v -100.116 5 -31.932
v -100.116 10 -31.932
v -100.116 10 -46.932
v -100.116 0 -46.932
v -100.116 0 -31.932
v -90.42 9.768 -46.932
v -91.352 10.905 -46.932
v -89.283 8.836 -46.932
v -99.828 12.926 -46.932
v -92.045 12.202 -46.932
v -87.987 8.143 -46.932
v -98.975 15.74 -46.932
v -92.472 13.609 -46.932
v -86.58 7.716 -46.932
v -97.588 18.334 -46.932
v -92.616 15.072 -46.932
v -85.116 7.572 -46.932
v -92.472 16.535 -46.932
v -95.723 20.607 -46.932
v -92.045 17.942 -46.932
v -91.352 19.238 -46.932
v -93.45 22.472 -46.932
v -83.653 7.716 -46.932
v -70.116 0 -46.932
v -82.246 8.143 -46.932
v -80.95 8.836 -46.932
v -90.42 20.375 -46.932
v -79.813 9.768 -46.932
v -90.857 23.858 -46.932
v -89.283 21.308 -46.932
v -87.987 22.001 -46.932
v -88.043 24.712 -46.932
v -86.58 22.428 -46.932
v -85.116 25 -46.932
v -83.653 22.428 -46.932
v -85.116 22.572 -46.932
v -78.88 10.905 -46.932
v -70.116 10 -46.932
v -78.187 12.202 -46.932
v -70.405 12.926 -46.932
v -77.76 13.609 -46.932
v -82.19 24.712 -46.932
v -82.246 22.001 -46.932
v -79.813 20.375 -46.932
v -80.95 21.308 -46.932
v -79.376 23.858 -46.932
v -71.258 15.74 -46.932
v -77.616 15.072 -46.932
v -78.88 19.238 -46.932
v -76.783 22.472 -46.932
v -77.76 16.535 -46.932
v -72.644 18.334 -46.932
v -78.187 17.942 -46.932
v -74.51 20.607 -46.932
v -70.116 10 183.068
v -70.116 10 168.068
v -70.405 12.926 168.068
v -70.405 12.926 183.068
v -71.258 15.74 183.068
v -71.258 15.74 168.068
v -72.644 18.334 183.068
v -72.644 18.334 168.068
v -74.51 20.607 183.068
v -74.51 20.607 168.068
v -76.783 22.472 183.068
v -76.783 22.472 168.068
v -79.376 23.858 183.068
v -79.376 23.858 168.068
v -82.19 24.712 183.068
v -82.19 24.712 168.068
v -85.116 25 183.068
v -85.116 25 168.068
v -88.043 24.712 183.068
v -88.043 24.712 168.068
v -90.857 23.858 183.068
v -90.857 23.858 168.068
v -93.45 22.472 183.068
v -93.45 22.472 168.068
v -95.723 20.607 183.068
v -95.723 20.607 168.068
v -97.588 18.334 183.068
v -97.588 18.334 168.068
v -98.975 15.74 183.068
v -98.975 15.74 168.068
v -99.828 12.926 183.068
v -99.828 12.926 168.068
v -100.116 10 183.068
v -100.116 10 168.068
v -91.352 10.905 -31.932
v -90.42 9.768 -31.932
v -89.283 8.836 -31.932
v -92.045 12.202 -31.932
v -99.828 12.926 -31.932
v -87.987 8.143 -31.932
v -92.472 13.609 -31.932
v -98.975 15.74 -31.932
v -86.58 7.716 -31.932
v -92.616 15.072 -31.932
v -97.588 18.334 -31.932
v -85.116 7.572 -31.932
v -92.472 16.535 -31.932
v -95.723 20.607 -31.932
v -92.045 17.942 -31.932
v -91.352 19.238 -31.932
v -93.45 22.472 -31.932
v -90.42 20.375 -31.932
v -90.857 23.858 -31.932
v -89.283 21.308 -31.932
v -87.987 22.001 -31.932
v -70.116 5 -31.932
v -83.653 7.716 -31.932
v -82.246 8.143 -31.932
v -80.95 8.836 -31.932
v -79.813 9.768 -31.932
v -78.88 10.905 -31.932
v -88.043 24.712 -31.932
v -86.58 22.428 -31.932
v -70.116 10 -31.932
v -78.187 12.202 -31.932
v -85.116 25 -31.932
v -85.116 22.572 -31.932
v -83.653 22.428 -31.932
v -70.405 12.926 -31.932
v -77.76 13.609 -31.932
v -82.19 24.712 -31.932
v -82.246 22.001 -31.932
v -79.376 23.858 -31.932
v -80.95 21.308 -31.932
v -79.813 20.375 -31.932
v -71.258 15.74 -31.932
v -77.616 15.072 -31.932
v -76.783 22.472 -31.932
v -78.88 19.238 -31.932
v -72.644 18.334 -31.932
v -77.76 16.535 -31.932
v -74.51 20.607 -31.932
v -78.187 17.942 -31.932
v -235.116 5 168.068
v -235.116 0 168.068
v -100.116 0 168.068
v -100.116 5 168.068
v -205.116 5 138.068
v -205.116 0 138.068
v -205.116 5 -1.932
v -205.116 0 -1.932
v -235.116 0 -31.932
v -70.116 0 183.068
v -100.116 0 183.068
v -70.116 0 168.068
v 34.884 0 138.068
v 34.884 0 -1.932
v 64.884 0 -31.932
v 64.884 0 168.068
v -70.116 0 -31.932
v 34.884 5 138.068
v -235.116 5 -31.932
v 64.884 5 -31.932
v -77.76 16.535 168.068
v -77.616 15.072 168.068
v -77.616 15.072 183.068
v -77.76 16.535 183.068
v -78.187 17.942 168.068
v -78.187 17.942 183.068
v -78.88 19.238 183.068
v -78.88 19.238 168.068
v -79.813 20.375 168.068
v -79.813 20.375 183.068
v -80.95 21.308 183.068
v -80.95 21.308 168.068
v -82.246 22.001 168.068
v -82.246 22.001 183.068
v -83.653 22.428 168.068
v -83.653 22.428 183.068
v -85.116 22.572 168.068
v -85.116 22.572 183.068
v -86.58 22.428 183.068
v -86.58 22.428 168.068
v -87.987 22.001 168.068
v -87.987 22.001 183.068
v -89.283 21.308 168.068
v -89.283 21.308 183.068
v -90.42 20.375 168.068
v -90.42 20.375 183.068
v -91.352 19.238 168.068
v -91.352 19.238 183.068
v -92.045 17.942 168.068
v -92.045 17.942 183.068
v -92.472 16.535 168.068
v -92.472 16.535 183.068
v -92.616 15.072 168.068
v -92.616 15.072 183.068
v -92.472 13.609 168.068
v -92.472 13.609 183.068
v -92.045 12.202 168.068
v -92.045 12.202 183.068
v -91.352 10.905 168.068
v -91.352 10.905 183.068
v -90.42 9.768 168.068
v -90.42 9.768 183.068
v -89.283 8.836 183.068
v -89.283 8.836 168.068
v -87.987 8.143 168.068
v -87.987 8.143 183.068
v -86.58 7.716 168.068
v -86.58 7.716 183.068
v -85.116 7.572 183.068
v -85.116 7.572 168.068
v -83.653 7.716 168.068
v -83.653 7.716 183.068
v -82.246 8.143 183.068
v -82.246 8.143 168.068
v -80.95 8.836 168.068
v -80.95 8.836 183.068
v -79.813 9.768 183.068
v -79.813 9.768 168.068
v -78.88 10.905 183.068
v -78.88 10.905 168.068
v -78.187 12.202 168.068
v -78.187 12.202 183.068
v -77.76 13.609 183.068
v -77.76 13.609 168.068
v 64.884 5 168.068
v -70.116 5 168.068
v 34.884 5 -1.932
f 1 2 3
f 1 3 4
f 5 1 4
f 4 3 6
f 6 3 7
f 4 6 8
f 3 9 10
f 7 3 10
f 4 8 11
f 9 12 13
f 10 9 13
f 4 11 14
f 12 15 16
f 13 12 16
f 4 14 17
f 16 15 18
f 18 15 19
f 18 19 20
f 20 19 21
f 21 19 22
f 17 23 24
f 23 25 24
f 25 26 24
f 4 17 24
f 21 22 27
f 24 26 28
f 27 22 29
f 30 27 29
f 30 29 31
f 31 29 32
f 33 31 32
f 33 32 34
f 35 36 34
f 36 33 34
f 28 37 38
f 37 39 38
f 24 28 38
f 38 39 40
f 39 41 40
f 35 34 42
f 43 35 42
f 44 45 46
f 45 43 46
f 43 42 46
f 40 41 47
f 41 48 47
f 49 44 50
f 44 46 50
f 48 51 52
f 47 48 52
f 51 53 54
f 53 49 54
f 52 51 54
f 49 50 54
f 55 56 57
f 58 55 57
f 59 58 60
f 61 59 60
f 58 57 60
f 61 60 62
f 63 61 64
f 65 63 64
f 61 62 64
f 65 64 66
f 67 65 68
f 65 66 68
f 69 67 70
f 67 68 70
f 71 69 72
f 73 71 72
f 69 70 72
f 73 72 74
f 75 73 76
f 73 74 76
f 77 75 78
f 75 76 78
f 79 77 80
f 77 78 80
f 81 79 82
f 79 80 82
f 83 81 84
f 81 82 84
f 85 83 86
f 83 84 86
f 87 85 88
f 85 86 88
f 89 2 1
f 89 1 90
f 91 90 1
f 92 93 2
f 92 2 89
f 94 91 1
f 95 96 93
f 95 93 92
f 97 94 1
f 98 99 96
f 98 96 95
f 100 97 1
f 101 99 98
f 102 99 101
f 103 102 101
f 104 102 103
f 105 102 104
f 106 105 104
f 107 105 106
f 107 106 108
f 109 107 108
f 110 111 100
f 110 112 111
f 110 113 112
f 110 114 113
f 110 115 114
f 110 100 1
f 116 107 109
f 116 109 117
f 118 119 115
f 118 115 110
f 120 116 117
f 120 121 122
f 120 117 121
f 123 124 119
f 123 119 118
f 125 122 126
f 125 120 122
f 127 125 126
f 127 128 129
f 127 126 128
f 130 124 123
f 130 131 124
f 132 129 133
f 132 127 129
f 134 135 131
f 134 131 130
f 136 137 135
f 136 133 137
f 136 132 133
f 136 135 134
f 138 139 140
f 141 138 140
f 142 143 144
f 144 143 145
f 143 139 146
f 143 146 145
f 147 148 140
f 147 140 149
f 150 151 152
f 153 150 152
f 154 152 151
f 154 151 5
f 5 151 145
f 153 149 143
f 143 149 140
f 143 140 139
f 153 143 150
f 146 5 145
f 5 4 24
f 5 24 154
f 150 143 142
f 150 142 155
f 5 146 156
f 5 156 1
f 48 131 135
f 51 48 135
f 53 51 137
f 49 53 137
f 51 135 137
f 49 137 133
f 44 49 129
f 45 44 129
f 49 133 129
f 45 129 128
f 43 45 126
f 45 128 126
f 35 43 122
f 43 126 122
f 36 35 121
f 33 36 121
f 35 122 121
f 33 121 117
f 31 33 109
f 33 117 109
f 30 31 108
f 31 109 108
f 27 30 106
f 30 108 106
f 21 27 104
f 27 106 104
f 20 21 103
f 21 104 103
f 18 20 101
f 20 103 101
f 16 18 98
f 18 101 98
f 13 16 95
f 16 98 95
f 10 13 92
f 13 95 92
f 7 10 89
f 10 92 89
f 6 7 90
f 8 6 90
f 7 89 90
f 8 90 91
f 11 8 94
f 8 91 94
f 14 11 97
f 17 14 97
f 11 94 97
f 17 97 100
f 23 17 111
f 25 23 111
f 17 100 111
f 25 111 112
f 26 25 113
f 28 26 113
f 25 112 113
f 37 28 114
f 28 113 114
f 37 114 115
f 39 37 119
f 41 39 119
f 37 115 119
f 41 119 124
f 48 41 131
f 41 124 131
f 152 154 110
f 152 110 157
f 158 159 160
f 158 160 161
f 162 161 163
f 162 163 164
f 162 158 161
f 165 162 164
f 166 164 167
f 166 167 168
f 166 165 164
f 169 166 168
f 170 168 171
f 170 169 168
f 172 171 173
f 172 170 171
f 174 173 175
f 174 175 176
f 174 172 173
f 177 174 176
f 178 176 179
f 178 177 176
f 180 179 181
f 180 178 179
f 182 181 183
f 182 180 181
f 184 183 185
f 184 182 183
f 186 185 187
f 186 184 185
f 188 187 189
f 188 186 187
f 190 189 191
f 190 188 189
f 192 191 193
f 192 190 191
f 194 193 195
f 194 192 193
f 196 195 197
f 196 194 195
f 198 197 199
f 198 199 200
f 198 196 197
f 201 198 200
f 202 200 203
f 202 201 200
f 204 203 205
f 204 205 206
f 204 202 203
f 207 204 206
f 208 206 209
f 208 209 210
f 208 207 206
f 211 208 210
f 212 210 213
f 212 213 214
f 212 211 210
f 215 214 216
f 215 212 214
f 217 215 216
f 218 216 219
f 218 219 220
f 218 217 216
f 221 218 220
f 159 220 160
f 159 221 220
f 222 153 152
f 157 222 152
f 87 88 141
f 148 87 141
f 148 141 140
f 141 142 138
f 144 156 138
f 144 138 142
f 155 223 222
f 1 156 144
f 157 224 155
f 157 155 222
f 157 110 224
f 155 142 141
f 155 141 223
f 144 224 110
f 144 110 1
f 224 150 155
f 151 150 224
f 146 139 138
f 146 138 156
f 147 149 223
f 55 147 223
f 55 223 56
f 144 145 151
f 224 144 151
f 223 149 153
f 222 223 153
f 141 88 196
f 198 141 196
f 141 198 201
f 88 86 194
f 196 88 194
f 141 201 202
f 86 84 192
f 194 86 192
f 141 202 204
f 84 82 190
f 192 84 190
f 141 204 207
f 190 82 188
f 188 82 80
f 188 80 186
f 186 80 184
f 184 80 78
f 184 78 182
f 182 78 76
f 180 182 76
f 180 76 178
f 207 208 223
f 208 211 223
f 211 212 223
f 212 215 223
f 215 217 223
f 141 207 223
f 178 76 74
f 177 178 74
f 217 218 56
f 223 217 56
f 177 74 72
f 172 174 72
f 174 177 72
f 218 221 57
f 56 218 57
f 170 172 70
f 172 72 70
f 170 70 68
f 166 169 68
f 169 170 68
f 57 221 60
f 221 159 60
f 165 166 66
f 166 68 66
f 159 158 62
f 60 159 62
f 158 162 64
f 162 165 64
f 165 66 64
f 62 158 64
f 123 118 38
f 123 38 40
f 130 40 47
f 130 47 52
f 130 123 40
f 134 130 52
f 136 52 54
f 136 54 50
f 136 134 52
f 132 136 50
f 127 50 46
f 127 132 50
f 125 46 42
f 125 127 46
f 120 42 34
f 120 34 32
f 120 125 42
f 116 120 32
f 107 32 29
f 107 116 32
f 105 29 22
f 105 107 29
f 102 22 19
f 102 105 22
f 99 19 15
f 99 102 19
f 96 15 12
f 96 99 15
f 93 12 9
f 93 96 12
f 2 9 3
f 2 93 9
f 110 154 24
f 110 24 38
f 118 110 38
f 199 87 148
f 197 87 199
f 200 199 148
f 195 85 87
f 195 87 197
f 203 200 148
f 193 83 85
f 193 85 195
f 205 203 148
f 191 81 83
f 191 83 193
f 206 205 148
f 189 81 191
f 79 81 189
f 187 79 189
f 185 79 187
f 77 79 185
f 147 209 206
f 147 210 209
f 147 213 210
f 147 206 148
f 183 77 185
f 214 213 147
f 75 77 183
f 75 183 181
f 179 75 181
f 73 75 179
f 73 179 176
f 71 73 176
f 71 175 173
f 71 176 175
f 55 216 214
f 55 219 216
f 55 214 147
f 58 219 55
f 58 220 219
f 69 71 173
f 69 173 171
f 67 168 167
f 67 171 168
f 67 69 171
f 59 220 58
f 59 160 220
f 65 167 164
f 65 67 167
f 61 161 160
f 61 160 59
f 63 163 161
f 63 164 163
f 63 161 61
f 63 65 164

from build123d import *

# Parameters (mm, degrees)
SKETCH1_W           = 300
SKETCH1_H           = 200
SKETCH1_W_2         = 240
SKETCH1_H_2         = 140
BOSS_EXTRUDE1_DEPTH = 5
SKETCH3_R           = 7.5
BOSS_EXTRUDE2_DEPTH = 15


with BuildPart() as part:
    # Sketch1 → Boss-Extrude1 (new body)
    with BuildSketch(Plane(origin=(0, 0, 0), x_dir=(1, 0, 0), z_dir=(0, 1, 0))):
        with Locations((-85.116384968, -68.067851076)):
            Rectangle(SKETCH1_W, SKETCH1_H)
        with Locations((-85.116384968, -68.067851076)):
            Rectangle(SKETCH1_W_2, SKETCH1_H_2, mode=Mode.SUBTRACT)
    extrude(amount=BOSS_EXTRUDE1_DEPTH)

    # Sketch3 → Boss-Extrude2 (add)
    with BuildSketch(Plane.XY.offset(168.067851076)):
        with BuildLine():
            Line((-100.116384968, 0), (-70.116384968, 0))
            Line((-70.116384968, 0), (-70.116384968, 10))
            ThreePointArc((-70.116384968, 10), (-85.116384968, 25), (-100.116384968, 10))
            Line((-100.116384968, 10), (-100.116384968, 0))
        make_face()
        with Locations((-85.116384968, 15.071690081)):
            Circle(SKETCH3_R, mode=Mode.SUBTRACT)
    boss_extrude2 = extrude(amount=BOSS_EXTRUDE2_DEPTH)

    # Mirror1: Boss-Extrude2 across plane
    add(boss_extrude2.mirror(Plane.XY.offset(68.067851076)))


solid = part.part
